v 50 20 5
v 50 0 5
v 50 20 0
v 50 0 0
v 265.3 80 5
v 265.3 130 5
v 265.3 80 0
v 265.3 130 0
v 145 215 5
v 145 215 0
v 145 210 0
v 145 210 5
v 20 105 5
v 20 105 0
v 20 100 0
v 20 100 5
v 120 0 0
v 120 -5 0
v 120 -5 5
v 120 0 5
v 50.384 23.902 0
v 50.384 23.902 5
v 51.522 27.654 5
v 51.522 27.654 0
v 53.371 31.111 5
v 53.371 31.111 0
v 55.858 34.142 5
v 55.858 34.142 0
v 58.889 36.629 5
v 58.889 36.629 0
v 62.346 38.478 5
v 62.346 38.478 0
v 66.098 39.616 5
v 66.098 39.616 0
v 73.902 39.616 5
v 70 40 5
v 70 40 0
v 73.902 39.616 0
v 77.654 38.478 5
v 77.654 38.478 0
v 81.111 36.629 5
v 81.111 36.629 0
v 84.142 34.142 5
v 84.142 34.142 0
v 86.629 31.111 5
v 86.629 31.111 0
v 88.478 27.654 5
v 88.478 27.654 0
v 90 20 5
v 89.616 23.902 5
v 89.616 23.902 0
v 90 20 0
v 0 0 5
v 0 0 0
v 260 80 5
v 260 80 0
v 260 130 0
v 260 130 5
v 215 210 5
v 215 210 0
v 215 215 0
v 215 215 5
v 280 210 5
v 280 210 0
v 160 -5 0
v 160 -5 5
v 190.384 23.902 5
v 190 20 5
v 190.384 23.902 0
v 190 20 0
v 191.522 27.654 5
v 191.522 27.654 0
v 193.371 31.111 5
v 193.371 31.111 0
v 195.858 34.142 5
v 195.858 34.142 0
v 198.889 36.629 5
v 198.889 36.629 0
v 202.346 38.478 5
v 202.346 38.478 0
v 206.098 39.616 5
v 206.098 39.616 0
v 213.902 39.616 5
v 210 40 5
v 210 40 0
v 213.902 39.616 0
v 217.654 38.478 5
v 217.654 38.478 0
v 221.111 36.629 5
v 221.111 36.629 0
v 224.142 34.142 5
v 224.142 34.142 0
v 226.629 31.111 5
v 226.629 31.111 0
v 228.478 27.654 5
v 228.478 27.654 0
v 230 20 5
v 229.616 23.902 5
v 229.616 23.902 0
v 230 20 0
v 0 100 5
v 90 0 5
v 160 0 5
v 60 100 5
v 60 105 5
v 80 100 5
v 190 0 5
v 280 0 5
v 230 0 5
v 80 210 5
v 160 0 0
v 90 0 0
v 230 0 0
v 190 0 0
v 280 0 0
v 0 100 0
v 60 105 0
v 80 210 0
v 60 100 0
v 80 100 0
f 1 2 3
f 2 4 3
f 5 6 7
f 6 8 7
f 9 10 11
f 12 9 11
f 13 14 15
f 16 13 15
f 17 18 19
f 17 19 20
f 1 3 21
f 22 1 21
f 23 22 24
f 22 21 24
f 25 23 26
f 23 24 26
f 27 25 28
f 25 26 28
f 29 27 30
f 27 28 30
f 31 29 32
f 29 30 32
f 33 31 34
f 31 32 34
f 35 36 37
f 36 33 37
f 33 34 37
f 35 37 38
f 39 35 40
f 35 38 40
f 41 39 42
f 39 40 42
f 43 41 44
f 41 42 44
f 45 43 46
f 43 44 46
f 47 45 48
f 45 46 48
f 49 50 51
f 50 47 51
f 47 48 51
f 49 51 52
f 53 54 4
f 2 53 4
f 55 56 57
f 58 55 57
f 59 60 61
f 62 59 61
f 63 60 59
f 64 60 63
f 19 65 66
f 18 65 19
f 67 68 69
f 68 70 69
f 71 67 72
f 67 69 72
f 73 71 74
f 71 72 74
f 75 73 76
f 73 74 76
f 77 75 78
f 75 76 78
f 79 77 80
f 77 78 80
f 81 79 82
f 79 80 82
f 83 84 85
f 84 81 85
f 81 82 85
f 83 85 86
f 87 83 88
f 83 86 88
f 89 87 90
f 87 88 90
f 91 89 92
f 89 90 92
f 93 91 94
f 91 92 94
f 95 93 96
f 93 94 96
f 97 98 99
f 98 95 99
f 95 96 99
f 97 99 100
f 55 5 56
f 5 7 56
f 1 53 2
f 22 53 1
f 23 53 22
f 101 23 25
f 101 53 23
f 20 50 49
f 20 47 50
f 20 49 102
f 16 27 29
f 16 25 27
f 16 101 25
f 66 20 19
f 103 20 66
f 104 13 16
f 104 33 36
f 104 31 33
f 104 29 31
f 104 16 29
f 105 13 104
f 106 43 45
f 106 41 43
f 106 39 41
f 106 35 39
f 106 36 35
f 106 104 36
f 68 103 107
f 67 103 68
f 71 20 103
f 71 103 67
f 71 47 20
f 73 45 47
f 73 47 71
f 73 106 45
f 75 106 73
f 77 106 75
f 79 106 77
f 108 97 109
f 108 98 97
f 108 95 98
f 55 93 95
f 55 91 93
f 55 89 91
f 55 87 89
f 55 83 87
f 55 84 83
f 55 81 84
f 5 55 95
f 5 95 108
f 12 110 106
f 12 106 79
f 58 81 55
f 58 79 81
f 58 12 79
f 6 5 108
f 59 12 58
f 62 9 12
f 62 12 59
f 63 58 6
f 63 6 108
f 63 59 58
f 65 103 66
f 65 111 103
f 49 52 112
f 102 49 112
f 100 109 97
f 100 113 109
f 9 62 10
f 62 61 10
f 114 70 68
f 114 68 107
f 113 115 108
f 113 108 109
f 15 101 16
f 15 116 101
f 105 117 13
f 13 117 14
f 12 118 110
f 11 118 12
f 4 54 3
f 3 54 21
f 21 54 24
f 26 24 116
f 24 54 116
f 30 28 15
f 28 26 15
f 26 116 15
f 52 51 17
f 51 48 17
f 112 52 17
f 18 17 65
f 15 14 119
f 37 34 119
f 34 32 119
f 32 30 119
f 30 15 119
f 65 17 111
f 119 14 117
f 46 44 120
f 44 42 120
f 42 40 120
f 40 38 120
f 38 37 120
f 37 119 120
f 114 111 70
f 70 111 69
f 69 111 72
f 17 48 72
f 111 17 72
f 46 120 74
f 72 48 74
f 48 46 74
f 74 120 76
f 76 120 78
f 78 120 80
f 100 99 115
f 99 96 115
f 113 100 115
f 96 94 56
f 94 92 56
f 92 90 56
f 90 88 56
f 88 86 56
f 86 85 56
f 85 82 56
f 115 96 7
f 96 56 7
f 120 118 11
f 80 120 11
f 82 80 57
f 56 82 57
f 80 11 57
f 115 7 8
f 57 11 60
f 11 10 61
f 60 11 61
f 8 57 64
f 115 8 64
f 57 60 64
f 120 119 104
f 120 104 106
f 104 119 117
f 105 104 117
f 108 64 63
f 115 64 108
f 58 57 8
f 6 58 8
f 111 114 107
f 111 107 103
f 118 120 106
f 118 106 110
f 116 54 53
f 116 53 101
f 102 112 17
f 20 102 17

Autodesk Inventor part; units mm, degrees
ref_plane "YZ Plane" through (0, 0, 0) normal (1, 0, 0) x (0, 1, 0)
ref_plane "XZ Plane" through (0, 0, 0) normal (0, 1, 0) x (-1, 0, 0)
ref_plane "XY Plane" through (0, 0, 0) normal (0, 0, 1) x (1, 0, 0)
sketch "Sketch1" plane through (0, 0, 0) normal (0, 0, 1) x (1, 0, 0)
  line L0 (0, 0) -> (0, 100)
  line L1 (0, 100) -> (80, 100)
  line L2 (80, 100) -> (80, 210)
  line L3 (80, 210) -> (280, 210)
  line L4 (280, 210) -> (280, 0)
  line L5 (0, 0) -> (50, 0)
  line L6 (50, 0) -> (50, 20)
  arc A0 (90, 20) -> (50, 20) centre (70, 20) ccw
  line L7 (90, 20) -> (90, 0)
  line L8 (140, 0) -> (140, 210) construction
  line L9 (90, 0) -> (140, 0)
  line L10 (280, 0) -> (230, 0)
  line L11 (230, 0) -> (230, 20)
  arc A1 (230, 20) -> (190, 20) centre (210, 20) ccw
  line L12 (190, 20) -> (190, 0)
  line L13 (190, 0) -> (140, 0)
  line L14 (145, 210) -> (215, 210)
  line L15 (215, 210) -> (215, 215)
  line L16 (215, 215) -> (145, 215)
  line L17 (145, 215) -> (145, 210)
  line L18 (265.3, 80) -> (260, 80)
  line L19 (260, 80) -> (260, 130)
  line L20 (260, 130) -> (265.3, 130)
  line L21 (265.3, 130) -> (265.3, 80)
  line L22 (9.7, 20) -> (15, 20)
  line L23 (15, 20) -> (15, 60)
  line L24 (15, 60) -> (9.7, 60)
  line L25 (9.7, 60) -> (9.7, 20)
  line L26 (20, 100) -> (60, 100)
  line L27 (60, 100) -> (60, 105)
  line L28 (60, 105) -> (20, 105)
  line L29 (20, 105) -> (20, 100)
  line L30 (160, 0) -> (160, -5)
  line L31 (160, -5) -> (120, -5)
  line L32 (120, -5) -> (120, 0)
  dimension "d0" = 100
  dimension "d1" = 80
  dimension "d2" = 110
  dimension "d3" = 200
  dimension "d4" = 50
  dimension "d5" = 20
  dimension "d6" = 40
  dimension "d7" = 70
  dimension "d8" = 5
  dimension "d9" = 5.3
  dimension "d10" = 50
  dimension "d12" = 50
  dimension "d13" = 5.3
  dimension "d14" = 40
  dimension "d17" = 40
  dimension "d18" = 5
  dimension "d19" = 40
  dimension "d20" = 5
  dimension "d21" = 20
extrude "Extrusion1" add sketch "Sketch1" along normal blind 5 contours L0 L1 L2 L3 L4 L10 L11 A1 L12 L13 L9 L7 A0 L6 L5 | L29 L28 L27 L1 | L9 L13 L30 L31 L32 | L17 L16 L15 L3 | L25 L24 L23 L22
properties part number "side"
